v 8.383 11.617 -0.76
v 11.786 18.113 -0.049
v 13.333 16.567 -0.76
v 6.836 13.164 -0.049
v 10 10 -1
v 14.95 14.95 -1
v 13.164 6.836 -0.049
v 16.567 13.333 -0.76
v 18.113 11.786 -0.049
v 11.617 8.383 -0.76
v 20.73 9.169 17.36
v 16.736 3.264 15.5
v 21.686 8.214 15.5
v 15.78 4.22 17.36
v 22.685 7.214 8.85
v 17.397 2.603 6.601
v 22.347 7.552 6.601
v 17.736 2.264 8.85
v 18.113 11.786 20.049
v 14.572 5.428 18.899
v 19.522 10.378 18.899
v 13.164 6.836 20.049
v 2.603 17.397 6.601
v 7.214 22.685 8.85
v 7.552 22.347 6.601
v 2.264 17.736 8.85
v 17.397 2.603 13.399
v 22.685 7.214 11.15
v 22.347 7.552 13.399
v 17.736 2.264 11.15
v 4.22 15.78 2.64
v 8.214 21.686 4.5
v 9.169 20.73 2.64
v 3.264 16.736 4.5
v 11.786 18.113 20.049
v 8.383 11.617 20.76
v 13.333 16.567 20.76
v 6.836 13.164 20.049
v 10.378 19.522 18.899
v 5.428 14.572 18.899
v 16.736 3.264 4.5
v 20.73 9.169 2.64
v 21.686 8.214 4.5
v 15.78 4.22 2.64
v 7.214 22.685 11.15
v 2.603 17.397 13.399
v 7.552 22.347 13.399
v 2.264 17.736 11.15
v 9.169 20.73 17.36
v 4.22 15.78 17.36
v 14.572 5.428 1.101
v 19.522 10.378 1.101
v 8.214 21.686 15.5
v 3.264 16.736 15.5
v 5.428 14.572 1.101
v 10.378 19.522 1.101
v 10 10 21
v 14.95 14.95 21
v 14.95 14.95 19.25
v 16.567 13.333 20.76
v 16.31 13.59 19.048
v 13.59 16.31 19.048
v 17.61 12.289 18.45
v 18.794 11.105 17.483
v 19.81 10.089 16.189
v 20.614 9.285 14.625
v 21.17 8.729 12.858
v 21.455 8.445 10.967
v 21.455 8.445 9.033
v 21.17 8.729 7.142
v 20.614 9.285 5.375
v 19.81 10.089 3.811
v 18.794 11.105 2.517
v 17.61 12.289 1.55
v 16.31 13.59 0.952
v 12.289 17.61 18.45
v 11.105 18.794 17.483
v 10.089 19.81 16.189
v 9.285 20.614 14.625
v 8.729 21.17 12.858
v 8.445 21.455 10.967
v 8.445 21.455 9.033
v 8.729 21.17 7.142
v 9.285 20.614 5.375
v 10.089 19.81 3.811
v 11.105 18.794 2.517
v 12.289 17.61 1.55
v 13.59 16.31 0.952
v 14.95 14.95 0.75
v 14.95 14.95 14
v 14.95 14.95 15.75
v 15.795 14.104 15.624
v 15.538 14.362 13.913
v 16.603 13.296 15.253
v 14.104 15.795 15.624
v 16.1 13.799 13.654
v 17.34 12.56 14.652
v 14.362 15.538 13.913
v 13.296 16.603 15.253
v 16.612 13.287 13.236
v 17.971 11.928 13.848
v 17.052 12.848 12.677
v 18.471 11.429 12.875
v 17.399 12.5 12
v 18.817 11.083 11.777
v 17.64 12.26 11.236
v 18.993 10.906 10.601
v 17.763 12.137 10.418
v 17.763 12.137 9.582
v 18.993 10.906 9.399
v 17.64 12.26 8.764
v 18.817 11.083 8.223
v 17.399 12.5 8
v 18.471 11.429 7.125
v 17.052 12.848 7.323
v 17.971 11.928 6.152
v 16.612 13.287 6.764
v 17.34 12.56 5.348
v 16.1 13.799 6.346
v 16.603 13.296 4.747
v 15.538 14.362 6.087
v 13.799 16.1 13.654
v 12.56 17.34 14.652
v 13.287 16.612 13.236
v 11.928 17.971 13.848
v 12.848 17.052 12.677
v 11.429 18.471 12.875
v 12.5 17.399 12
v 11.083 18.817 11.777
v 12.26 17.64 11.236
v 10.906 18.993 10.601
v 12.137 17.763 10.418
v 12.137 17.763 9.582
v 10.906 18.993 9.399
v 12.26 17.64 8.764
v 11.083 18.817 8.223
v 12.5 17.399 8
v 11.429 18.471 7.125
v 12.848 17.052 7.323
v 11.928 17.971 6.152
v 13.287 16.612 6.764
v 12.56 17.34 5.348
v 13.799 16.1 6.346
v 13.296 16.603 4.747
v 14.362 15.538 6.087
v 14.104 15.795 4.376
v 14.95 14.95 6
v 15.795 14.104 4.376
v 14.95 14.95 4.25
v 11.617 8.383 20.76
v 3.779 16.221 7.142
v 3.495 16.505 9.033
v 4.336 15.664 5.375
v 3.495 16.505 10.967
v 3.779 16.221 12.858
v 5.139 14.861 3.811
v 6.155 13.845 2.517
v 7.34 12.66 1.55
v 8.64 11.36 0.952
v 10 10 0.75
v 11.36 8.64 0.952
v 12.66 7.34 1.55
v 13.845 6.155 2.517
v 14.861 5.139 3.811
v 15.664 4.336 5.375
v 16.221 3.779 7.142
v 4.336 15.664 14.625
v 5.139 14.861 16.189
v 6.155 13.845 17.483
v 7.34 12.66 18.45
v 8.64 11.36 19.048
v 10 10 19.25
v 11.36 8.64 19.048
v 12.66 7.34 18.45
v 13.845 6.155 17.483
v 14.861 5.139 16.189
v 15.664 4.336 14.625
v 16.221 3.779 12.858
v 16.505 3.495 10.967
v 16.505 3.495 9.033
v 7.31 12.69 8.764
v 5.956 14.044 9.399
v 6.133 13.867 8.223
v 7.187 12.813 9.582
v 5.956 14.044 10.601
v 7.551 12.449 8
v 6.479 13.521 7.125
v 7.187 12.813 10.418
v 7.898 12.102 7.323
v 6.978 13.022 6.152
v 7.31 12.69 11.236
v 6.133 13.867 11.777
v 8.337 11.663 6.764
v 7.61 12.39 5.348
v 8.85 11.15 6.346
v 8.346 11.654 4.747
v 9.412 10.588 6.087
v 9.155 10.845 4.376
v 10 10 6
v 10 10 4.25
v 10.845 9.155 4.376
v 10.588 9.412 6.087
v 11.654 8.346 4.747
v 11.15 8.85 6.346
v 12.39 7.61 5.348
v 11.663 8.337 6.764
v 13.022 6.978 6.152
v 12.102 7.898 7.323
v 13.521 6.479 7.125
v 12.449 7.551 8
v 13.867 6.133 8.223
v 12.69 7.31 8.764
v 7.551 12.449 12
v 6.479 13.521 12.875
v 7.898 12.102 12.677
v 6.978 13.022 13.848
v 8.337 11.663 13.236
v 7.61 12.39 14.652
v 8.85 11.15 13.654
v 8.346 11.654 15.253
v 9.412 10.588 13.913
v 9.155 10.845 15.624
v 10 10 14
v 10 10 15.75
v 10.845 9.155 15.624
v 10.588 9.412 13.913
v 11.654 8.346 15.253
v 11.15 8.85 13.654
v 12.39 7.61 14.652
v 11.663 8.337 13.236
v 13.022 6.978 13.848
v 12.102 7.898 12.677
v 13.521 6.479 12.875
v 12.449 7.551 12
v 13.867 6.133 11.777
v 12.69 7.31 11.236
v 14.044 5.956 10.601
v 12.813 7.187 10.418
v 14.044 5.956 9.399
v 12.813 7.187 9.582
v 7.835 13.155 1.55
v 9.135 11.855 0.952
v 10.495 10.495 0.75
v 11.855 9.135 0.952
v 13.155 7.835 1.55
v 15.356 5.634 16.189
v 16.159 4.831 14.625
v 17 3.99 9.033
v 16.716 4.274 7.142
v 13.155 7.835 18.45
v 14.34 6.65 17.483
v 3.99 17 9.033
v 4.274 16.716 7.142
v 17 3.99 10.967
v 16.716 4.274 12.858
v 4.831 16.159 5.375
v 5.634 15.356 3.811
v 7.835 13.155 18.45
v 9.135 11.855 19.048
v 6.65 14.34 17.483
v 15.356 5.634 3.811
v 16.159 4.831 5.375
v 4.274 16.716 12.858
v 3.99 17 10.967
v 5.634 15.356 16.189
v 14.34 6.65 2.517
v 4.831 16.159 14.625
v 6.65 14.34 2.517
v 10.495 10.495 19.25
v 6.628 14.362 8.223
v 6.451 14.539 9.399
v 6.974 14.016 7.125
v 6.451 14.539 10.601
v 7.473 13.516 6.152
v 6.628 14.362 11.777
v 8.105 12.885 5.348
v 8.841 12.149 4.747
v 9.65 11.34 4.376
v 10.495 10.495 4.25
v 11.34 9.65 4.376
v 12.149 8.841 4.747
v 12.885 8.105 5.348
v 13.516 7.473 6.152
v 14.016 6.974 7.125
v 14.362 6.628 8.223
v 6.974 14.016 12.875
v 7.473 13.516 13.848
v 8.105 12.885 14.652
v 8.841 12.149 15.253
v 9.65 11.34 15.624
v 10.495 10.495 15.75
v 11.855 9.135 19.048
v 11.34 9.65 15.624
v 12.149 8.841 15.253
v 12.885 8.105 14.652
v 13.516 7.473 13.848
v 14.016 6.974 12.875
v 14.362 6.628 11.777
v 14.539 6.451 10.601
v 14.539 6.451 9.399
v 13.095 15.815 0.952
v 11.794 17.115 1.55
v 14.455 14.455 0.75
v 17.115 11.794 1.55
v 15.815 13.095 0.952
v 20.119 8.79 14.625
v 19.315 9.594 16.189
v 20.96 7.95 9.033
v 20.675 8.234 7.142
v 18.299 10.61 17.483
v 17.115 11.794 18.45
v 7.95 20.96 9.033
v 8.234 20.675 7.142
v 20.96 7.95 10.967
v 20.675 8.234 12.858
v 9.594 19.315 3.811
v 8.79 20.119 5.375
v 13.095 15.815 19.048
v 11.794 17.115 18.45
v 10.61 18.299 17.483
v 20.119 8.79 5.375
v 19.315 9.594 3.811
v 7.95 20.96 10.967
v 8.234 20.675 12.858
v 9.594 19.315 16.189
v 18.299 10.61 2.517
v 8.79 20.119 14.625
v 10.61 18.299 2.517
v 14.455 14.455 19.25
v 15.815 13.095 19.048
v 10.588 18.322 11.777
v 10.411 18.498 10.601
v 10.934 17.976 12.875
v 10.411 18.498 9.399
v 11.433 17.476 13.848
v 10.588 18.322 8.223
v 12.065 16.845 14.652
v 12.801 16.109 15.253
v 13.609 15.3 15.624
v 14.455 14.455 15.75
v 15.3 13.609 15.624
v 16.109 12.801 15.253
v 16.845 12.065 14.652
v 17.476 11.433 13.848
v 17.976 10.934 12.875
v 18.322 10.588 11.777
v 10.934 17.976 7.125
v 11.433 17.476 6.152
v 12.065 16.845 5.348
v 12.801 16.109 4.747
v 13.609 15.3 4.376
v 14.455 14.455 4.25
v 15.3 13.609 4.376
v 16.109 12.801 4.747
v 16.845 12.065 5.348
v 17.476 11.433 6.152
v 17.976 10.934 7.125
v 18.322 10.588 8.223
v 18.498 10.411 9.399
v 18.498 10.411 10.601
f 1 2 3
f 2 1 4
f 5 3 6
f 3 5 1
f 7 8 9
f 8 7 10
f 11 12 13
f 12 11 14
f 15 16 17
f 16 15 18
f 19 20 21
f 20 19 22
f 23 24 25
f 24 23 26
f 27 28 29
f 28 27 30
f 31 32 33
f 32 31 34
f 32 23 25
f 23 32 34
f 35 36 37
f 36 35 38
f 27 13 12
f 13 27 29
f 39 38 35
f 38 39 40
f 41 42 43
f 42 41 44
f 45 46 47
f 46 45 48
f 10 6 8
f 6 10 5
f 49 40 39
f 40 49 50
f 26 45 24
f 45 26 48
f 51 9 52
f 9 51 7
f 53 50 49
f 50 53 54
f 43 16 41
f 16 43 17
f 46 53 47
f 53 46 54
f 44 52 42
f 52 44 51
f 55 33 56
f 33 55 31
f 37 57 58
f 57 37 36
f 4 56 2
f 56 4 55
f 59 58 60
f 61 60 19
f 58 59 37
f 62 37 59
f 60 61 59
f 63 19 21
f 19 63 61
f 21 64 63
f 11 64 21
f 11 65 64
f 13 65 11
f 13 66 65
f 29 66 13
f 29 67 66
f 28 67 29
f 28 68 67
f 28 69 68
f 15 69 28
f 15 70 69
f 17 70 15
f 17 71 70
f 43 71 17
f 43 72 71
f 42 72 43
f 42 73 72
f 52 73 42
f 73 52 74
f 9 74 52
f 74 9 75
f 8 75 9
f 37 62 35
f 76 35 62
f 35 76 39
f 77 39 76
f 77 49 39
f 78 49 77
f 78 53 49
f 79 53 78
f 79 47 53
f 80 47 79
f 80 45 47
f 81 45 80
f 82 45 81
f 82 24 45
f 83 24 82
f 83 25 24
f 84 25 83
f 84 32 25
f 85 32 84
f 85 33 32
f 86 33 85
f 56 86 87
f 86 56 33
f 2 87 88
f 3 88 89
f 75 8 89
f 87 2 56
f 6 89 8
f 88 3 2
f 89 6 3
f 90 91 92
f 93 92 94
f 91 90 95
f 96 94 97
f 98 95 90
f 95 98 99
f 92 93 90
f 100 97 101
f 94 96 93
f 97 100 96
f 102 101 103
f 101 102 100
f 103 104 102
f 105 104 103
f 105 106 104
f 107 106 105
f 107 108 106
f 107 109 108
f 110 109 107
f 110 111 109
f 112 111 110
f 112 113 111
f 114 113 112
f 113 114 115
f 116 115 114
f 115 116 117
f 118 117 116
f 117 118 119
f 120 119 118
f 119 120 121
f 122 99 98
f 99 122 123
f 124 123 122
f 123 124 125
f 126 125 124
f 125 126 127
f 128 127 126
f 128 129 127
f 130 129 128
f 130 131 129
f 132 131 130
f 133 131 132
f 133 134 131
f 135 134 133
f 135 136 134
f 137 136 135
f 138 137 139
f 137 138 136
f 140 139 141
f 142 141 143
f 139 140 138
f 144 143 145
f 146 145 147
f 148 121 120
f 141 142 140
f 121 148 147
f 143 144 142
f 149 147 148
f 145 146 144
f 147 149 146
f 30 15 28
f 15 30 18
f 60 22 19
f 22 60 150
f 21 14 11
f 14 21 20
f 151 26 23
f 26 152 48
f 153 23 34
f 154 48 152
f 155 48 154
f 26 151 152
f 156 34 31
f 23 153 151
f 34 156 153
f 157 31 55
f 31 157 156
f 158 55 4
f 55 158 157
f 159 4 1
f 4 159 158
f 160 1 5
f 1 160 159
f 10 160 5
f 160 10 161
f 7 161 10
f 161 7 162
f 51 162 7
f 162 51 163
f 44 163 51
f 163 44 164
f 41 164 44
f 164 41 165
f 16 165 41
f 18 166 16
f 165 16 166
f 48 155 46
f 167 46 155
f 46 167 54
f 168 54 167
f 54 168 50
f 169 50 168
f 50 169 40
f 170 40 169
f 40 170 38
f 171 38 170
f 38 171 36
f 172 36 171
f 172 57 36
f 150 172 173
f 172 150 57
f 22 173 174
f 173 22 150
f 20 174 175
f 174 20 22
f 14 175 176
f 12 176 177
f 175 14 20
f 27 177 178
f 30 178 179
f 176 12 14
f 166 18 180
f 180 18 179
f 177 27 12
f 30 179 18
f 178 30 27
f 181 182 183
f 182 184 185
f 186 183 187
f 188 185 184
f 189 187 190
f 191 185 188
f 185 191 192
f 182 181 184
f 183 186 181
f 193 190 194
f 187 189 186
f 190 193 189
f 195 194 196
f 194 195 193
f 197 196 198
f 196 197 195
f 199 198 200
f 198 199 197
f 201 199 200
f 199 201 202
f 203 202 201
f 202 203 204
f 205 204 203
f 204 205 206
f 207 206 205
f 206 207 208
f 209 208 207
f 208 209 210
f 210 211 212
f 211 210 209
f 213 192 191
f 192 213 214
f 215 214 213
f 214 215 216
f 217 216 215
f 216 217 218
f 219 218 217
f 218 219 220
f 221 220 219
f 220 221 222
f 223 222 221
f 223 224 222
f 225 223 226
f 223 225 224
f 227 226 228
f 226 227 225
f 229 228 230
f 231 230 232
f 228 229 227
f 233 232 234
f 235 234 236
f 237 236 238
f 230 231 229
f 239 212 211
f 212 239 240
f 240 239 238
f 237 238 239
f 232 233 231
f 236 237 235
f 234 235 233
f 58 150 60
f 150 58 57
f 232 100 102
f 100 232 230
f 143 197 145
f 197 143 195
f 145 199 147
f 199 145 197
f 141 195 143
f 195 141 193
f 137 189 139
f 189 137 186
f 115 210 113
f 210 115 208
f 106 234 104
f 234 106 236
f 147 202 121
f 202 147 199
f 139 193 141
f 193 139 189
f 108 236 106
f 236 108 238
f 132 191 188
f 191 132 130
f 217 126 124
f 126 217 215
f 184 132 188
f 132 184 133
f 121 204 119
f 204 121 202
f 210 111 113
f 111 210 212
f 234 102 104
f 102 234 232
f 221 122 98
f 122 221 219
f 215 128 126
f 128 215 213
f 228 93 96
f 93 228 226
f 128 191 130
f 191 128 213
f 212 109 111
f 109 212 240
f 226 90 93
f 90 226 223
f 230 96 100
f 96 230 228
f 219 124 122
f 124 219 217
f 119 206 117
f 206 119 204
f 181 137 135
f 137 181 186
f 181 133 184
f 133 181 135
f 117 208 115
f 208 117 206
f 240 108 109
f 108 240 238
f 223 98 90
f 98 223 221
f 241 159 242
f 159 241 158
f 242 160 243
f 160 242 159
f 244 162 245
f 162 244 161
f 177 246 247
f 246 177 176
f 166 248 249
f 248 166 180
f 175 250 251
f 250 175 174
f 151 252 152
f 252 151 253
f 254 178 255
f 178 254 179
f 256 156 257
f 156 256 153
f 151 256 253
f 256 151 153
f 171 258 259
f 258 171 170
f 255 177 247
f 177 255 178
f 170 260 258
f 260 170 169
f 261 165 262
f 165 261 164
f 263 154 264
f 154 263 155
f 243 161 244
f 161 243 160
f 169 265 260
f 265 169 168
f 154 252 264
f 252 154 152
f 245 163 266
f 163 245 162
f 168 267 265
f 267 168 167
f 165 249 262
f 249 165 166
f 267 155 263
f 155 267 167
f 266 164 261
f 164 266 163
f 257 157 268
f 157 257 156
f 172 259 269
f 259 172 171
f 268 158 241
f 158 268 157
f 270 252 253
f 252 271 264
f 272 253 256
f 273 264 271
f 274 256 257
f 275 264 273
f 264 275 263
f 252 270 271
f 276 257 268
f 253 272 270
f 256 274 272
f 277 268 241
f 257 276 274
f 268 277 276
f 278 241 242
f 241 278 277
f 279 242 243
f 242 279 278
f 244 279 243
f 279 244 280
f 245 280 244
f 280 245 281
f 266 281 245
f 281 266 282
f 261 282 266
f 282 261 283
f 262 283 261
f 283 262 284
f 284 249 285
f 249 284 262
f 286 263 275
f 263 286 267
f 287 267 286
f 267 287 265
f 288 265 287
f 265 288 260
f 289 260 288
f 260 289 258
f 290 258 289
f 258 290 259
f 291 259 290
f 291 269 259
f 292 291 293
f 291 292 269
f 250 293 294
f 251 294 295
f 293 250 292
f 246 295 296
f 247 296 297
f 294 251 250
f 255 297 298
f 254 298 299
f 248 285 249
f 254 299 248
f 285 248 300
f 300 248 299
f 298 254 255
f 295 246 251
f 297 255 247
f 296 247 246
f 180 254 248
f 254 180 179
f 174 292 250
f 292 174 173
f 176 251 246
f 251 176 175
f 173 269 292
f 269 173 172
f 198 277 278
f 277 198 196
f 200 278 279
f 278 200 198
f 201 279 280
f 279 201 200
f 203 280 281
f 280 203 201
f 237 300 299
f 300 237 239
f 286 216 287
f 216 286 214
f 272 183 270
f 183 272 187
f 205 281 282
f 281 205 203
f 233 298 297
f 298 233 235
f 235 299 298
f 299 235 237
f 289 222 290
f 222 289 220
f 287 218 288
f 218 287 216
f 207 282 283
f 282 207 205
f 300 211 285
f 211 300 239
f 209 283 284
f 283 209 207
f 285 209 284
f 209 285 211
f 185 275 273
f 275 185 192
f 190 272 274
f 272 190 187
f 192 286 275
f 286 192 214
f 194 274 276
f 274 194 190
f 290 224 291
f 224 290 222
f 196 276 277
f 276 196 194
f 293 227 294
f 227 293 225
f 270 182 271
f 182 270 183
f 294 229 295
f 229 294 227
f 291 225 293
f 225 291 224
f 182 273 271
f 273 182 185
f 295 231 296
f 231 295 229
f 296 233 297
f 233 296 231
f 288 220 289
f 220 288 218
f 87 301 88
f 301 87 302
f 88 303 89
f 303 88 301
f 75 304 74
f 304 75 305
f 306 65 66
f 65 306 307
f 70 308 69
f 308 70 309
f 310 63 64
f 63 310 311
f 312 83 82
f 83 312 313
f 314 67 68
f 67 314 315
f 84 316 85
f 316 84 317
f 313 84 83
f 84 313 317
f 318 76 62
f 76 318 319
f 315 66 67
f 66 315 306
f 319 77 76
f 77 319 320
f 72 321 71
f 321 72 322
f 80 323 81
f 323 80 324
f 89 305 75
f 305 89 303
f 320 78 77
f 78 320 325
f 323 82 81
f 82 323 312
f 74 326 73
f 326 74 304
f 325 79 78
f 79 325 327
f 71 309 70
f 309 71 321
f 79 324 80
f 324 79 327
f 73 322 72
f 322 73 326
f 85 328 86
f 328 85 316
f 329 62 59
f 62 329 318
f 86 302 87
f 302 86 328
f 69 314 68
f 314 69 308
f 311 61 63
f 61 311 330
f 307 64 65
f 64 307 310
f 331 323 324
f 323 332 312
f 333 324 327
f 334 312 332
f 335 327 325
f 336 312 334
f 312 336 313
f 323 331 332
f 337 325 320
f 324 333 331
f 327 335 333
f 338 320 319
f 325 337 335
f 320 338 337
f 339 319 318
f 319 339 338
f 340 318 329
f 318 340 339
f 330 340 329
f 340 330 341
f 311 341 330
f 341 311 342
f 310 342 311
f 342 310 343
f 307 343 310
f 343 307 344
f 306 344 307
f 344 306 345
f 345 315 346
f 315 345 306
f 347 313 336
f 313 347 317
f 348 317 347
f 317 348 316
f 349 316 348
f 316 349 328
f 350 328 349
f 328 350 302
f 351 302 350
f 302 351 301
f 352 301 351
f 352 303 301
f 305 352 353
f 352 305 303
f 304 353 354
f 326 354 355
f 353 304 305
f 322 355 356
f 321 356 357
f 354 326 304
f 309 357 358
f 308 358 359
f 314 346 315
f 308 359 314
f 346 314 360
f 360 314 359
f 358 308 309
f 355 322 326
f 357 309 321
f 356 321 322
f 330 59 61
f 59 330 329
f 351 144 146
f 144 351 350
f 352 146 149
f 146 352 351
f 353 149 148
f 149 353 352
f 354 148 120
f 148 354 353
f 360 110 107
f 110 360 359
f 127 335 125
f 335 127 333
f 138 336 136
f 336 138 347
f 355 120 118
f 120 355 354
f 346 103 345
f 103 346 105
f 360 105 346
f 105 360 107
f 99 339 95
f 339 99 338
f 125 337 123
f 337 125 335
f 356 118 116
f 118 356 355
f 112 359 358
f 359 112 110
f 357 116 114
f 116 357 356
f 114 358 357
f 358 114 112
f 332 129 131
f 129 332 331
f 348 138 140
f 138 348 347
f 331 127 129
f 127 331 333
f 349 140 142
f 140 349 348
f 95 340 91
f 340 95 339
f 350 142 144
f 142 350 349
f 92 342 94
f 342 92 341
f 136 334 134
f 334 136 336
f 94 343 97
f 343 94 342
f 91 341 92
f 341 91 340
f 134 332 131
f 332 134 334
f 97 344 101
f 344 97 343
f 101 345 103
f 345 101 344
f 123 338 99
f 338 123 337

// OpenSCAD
/*
 * Bearing model.
 *
 * Originally by Hans Häggström, 2010.
 * Modified by Frédéric Mantegazza (2015)
 *
 * Dual licenced under Creative Commons Attribution-Share Alike 3.0 and LGPL2 or later
 */

EPSILON = 0.01;


BEARING_INNER_DIAMETER = 0;
BEARING_OUTER_DIAMETER = 1;
BEARING_WIDTH = 2;


// Bearing dimensions
// model == XXX ? [inner dia, outer dia, width]:
function bearingDimensions(model) =
    model == 683 ? [3, 7, 2]:
    model == "MR83" ? [3, 8, 3]:
    model ==  623 ? [ 3, 10, 4]:
    model ==  624 ? [ 4, 13, 5]:
    model ==  684 ? [ 5, 11, 5]:  // or [4, 9, 4]: ???
    model == "MR105" ? [5, 10, 3]:
    model == "MR115" ? [5, 11, 4]:
    model ==  695 ? [ 5, 13, 4]:
    model ==  605 ? [ 5, 14, 5]:
    model ==  625 ? [ 5, 16, 5]:
    model ==  106 ? [ 6, 10, 3]:
    model ==  126 ? [ 6, 12, 4]:
    model ==  696 ? [6, 15, 5]:
    model ==  626 ? [6, 19, 6]:
    model ==  627 ? [ 7, 22, 7]:
    model ==  688 ? [ 8, 16, 4]:
    model ==  698 ? [ 8, 19, 6]:
    model ==  608 ? [ 8, 22, 7]:
    model == 6700 ? [10, 16, 4]:
    model == 6800 ? [10, 19, 5]:
    model == 6900 ? [10, 22, 6]:
    model == 6701 ? [12, 18, 4]:
    model == 6801 ? [12, 21, 5]:
    model == 6901 ? [12, 24, 6]:
    model == 6702 ? [15, 21, 4]:
    model == 6703 ? [17, 23, 4]:
    [8, 22, 7]; // this is the default


function bearing_d(model) = bearingDimensions(model)[BEARING_INNER_DIAMETER];
function bearing_D(model) = bearingDimensions(model)[BEARING_OUTER_DIAMETER];
function bearing_w(model) = bearingDimensions(model)[BEARING_WIDTH];


module _bearing(d, D, w, pos, rot) {

    module ring(D, d, w) {
        difference() {
            cylinder(r=D/2, h=w, $fs=0.1);
            translate([0,0,-EPSILON]) {
                cylinder(r=d/2, h=w+2*EPSILON, $fs=0.1);
            }
        }
    }

    inner_rim = d + (D - d) * 0.25;
    outer_rim = D - (D - d) * 0.25;
    mid_sink = w * 0.1;

    translate(pos) rotate(rot) {
        difference() {
            ring(D, d, w);
            translate([0, 0, -EPSILON]) {
                ring(outer_rim, inner_rim, mid_sink+EPSILON);
            }
            translate([0, 0, w-mid_sink]) {
                ring(outer_rim, inner_rim, mid_sink+EPSILON);
            }
        }
    }
}


module bearing(model, pos=[0,0,0], rot=[0,0,0]) {
    d = bearing_d(model);
    D = bearing_D(model);
    w = bearing_w(model);
//    color([0.5, 0.5, 0.5]) {
        _bearing(d, D, w, pos, rot);
//    }
}


bearing(model=608, pos=[10, 10, 10], rot=[0, 90, 45]);
